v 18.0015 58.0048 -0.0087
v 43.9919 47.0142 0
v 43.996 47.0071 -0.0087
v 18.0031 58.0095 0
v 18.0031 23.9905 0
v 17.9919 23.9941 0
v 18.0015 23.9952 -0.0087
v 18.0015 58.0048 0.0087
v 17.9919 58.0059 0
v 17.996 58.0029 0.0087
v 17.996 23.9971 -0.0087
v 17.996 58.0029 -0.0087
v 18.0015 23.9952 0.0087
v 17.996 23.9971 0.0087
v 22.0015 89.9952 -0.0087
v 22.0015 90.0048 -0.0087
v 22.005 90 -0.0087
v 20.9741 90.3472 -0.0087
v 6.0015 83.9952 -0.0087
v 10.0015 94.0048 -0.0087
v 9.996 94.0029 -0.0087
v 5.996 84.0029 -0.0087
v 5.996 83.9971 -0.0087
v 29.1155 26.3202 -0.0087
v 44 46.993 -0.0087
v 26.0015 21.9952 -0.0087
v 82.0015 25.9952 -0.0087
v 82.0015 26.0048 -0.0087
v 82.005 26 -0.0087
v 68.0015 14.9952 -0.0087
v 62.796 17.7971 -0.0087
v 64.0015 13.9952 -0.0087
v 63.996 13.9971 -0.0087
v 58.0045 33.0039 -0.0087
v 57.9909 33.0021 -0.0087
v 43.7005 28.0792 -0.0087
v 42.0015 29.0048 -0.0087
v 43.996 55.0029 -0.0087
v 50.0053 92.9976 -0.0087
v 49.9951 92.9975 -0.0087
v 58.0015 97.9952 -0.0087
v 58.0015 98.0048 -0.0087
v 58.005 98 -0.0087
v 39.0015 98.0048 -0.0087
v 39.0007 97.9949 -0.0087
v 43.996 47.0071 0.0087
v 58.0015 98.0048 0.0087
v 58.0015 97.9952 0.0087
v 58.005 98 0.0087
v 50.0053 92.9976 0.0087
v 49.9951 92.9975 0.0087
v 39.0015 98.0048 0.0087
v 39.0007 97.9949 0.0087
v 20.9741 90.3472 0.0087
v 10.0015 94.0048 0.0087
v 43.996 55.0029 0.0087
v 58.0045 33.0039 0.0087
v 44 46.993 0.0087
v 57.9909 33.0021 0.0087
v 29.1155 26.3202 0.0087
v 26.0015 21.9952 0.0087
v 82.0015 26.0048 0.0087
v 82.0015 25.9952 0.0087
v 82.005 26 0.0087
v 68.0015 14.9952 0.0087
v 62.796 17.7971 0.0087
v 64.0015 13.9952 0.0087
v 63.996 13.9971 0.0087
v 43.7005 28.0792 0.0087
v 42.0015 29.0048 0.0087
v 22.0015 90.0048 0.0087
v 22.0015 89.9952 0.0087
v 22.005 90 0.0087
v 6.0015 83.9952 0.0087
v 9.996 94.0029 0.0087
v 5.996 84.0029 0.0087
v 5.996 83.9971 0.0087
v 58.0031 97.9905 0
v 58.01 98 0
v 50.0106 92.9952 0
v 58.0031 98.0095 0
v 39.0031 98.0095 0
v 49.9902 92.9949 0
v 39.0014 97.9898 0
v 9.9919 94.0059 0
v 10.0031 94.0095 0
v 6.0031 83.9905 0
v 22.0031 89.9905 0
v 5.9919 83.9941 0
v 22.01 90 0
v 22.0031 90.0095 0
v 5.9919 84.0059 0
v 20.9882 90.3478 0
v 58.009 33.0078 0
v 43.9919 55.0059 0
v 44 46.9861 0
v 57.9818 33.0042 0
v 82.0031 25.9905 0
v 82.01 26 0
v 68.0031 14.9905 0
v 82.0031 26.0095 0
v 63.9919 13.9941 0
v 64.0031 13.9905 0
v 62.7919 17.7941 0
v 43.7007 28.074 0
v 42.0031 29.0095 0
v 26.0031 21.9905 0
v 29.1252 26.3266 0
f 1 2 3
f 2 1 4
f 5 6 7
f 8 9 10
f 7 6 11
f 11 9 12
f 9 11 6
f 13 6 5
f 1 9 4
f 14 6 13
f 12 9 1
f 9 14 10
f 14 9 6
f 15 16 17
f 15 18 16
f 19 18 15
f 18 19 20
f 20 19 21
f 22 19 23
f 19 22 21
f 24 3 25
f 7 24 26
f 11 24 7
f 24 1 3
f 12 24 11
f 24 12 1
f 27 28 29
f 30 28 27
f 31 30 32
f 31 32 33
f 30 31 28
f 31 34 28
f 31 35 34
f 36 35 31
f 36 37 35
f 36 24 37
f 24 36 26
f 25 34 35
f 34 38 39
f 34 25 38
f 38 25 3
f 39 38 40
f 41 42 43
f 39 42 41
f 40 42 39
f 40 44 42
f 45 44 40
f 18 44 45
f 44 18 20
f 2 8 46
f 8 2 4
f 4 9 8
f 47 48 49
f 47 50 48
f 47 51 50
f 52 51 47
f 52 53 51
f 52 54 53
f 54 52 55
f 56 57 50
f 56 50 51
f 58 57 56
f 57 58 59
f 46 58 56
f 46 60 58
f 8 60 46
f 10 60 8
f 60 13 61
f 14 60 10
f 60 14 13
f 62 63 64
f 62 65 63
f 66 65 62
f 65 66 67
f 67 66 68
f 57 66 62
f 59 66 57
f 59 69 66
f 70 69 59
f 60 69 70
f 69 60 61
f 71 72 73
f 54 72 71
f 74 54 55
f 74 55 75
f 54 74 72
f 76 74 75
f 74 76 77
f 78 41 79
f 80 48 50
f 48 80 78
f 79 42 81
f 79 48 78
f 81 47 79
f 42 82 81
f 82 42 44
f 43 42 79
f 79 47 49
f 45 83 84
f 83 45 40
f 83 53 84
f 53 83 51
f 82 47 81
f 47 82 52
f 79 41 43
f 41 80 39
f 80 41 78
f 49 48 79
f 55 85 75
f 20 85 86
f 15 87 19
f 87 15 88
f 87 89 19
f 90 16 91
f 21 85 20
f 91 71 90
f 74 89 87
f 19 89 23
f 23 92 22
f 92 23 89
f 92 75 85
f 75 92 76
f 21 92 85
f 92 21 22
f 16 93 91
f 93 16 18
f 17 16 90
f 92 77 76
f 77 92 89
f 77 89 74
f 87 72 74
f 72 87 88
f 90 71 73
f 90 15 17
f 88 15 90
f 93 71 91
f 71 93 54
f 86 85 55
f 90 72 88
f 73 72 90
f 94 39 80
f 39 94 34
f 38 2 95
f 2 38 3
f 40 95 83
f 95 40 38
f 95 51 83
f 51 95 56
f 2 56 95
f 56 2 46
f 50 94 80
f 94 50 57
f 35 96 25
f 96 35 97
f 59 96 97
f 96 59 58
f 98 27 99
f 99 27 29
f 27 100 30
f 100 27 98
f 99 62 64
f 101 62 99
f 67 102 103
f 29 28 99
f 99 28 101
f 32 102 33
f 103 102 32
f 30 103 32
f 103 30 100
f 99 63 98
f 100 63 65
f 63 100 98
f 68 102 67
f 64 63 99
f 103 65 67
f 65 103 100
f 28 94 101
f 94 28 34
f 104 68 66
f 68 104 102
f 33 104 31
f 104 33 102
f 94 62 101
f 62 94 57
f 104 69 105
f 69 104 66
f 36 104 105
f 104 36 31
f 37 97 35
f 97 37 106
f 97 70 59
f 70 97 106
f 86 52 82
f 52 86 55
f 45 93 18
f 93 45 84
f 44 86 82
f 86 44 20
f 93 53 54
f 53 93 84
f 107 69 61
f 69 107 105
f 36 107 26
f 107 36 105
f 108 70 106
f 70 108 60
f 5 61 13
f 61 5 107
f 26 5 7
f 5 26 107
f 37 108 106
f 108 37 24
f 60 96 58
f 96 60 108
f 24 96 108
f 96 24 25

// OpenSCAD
color([0.3519350680925015,0.6477014615427978,0.14125726454845833]) hull(){
    translate([18,58]) sphere(0.01);
    translate([18,24]) sphere(0.01);
    translate([44,47]) sphere(0.01);
}
color([0.23013900541024712,0.8285218163248013,0.9603761550286747]) hull(){
    translate([58,98]) sphere(0.01);
    translate([50,93]) sphere(0.01);
    translate([39,98]) sphere(0.01);
}
color([0.6050710034948523,0.017553655236826726,0.43262871278032167]) hull(){
    translate([22,90]) sphere(0.01);
    translate([10,94]) sphere(0.01);
    translate([6,84]) sphere(0.01);
}
color([0.2571490251669072,0.4480229944680496,0.14517873337393172]) hull(){
    translate([50,93]) sphere(0.01);
    translate([44,55]) sphere(0.01);
    translate([58,33]) sphere(0.01);
}
color([0.8405131005933094,0.9776834869331054,0.10300019528175153]) hull(){
    translate([44,55]) sphere(0.01);
    translate([58,33]) sphere(0.01);
    translate([44,47]) sphere(0.01);
}
color([0.998153073210626,0.8535026464000083,0.6855970549077809]) hull(){
    translate([64,14]) sphere(0.01);
    translate([68,15]) sphere(0.01);
    translate([82,26]) sphere(0.01);
}
color([0.7995005100691247,0.34047238184459006,0.1286635278612125]) hull(){
    translate([64,14]) sphere(0.01);
    translate([58,33]) sphere(0.01);
    translate([82,26]) sphere(0.01);
}
color([0.6020598448119898,0.9167847797194366,0.02081986636819022]) hull(){
    translate([68,15]) sphere(0.01);
    translate([58,33]) sphere(0.01);
    translate([42,29]) sphere(0.01);
}
color([0.9135118305629362,0.3823609034395232,0.42581309278619206]) hull(){
    translate([10,94]) sphere(0.01);
    translate([6,84]) sphere(0.01);
    translate([39,98]) sphere(0.01);
}
color([0.08967296065919184,0.0016857337534631478,0.31287848776698257]) hull(){
    translate([58,33]) sphere(0.01);
    translate([42,29]) sphere(0.01);
    translate([26,22]) sphere(0.01);
}
color([0.09731792302828757,0.364404074066101,0.8754307508322564]) hull(){
    translate([42,29]) sphere(0.01);
    translate([26,22]) sphere(0.01);
    translate([18,24]) sphere(0.01);
}
color([0.6967090939923642,0.5776053806129825,0.18685318159950626]) hull(){
    translate([26,22]) sphere(0.01);
    translate([18,24]) sphere(0.01);
    translate([44,47]) sphere(0.01);
}
